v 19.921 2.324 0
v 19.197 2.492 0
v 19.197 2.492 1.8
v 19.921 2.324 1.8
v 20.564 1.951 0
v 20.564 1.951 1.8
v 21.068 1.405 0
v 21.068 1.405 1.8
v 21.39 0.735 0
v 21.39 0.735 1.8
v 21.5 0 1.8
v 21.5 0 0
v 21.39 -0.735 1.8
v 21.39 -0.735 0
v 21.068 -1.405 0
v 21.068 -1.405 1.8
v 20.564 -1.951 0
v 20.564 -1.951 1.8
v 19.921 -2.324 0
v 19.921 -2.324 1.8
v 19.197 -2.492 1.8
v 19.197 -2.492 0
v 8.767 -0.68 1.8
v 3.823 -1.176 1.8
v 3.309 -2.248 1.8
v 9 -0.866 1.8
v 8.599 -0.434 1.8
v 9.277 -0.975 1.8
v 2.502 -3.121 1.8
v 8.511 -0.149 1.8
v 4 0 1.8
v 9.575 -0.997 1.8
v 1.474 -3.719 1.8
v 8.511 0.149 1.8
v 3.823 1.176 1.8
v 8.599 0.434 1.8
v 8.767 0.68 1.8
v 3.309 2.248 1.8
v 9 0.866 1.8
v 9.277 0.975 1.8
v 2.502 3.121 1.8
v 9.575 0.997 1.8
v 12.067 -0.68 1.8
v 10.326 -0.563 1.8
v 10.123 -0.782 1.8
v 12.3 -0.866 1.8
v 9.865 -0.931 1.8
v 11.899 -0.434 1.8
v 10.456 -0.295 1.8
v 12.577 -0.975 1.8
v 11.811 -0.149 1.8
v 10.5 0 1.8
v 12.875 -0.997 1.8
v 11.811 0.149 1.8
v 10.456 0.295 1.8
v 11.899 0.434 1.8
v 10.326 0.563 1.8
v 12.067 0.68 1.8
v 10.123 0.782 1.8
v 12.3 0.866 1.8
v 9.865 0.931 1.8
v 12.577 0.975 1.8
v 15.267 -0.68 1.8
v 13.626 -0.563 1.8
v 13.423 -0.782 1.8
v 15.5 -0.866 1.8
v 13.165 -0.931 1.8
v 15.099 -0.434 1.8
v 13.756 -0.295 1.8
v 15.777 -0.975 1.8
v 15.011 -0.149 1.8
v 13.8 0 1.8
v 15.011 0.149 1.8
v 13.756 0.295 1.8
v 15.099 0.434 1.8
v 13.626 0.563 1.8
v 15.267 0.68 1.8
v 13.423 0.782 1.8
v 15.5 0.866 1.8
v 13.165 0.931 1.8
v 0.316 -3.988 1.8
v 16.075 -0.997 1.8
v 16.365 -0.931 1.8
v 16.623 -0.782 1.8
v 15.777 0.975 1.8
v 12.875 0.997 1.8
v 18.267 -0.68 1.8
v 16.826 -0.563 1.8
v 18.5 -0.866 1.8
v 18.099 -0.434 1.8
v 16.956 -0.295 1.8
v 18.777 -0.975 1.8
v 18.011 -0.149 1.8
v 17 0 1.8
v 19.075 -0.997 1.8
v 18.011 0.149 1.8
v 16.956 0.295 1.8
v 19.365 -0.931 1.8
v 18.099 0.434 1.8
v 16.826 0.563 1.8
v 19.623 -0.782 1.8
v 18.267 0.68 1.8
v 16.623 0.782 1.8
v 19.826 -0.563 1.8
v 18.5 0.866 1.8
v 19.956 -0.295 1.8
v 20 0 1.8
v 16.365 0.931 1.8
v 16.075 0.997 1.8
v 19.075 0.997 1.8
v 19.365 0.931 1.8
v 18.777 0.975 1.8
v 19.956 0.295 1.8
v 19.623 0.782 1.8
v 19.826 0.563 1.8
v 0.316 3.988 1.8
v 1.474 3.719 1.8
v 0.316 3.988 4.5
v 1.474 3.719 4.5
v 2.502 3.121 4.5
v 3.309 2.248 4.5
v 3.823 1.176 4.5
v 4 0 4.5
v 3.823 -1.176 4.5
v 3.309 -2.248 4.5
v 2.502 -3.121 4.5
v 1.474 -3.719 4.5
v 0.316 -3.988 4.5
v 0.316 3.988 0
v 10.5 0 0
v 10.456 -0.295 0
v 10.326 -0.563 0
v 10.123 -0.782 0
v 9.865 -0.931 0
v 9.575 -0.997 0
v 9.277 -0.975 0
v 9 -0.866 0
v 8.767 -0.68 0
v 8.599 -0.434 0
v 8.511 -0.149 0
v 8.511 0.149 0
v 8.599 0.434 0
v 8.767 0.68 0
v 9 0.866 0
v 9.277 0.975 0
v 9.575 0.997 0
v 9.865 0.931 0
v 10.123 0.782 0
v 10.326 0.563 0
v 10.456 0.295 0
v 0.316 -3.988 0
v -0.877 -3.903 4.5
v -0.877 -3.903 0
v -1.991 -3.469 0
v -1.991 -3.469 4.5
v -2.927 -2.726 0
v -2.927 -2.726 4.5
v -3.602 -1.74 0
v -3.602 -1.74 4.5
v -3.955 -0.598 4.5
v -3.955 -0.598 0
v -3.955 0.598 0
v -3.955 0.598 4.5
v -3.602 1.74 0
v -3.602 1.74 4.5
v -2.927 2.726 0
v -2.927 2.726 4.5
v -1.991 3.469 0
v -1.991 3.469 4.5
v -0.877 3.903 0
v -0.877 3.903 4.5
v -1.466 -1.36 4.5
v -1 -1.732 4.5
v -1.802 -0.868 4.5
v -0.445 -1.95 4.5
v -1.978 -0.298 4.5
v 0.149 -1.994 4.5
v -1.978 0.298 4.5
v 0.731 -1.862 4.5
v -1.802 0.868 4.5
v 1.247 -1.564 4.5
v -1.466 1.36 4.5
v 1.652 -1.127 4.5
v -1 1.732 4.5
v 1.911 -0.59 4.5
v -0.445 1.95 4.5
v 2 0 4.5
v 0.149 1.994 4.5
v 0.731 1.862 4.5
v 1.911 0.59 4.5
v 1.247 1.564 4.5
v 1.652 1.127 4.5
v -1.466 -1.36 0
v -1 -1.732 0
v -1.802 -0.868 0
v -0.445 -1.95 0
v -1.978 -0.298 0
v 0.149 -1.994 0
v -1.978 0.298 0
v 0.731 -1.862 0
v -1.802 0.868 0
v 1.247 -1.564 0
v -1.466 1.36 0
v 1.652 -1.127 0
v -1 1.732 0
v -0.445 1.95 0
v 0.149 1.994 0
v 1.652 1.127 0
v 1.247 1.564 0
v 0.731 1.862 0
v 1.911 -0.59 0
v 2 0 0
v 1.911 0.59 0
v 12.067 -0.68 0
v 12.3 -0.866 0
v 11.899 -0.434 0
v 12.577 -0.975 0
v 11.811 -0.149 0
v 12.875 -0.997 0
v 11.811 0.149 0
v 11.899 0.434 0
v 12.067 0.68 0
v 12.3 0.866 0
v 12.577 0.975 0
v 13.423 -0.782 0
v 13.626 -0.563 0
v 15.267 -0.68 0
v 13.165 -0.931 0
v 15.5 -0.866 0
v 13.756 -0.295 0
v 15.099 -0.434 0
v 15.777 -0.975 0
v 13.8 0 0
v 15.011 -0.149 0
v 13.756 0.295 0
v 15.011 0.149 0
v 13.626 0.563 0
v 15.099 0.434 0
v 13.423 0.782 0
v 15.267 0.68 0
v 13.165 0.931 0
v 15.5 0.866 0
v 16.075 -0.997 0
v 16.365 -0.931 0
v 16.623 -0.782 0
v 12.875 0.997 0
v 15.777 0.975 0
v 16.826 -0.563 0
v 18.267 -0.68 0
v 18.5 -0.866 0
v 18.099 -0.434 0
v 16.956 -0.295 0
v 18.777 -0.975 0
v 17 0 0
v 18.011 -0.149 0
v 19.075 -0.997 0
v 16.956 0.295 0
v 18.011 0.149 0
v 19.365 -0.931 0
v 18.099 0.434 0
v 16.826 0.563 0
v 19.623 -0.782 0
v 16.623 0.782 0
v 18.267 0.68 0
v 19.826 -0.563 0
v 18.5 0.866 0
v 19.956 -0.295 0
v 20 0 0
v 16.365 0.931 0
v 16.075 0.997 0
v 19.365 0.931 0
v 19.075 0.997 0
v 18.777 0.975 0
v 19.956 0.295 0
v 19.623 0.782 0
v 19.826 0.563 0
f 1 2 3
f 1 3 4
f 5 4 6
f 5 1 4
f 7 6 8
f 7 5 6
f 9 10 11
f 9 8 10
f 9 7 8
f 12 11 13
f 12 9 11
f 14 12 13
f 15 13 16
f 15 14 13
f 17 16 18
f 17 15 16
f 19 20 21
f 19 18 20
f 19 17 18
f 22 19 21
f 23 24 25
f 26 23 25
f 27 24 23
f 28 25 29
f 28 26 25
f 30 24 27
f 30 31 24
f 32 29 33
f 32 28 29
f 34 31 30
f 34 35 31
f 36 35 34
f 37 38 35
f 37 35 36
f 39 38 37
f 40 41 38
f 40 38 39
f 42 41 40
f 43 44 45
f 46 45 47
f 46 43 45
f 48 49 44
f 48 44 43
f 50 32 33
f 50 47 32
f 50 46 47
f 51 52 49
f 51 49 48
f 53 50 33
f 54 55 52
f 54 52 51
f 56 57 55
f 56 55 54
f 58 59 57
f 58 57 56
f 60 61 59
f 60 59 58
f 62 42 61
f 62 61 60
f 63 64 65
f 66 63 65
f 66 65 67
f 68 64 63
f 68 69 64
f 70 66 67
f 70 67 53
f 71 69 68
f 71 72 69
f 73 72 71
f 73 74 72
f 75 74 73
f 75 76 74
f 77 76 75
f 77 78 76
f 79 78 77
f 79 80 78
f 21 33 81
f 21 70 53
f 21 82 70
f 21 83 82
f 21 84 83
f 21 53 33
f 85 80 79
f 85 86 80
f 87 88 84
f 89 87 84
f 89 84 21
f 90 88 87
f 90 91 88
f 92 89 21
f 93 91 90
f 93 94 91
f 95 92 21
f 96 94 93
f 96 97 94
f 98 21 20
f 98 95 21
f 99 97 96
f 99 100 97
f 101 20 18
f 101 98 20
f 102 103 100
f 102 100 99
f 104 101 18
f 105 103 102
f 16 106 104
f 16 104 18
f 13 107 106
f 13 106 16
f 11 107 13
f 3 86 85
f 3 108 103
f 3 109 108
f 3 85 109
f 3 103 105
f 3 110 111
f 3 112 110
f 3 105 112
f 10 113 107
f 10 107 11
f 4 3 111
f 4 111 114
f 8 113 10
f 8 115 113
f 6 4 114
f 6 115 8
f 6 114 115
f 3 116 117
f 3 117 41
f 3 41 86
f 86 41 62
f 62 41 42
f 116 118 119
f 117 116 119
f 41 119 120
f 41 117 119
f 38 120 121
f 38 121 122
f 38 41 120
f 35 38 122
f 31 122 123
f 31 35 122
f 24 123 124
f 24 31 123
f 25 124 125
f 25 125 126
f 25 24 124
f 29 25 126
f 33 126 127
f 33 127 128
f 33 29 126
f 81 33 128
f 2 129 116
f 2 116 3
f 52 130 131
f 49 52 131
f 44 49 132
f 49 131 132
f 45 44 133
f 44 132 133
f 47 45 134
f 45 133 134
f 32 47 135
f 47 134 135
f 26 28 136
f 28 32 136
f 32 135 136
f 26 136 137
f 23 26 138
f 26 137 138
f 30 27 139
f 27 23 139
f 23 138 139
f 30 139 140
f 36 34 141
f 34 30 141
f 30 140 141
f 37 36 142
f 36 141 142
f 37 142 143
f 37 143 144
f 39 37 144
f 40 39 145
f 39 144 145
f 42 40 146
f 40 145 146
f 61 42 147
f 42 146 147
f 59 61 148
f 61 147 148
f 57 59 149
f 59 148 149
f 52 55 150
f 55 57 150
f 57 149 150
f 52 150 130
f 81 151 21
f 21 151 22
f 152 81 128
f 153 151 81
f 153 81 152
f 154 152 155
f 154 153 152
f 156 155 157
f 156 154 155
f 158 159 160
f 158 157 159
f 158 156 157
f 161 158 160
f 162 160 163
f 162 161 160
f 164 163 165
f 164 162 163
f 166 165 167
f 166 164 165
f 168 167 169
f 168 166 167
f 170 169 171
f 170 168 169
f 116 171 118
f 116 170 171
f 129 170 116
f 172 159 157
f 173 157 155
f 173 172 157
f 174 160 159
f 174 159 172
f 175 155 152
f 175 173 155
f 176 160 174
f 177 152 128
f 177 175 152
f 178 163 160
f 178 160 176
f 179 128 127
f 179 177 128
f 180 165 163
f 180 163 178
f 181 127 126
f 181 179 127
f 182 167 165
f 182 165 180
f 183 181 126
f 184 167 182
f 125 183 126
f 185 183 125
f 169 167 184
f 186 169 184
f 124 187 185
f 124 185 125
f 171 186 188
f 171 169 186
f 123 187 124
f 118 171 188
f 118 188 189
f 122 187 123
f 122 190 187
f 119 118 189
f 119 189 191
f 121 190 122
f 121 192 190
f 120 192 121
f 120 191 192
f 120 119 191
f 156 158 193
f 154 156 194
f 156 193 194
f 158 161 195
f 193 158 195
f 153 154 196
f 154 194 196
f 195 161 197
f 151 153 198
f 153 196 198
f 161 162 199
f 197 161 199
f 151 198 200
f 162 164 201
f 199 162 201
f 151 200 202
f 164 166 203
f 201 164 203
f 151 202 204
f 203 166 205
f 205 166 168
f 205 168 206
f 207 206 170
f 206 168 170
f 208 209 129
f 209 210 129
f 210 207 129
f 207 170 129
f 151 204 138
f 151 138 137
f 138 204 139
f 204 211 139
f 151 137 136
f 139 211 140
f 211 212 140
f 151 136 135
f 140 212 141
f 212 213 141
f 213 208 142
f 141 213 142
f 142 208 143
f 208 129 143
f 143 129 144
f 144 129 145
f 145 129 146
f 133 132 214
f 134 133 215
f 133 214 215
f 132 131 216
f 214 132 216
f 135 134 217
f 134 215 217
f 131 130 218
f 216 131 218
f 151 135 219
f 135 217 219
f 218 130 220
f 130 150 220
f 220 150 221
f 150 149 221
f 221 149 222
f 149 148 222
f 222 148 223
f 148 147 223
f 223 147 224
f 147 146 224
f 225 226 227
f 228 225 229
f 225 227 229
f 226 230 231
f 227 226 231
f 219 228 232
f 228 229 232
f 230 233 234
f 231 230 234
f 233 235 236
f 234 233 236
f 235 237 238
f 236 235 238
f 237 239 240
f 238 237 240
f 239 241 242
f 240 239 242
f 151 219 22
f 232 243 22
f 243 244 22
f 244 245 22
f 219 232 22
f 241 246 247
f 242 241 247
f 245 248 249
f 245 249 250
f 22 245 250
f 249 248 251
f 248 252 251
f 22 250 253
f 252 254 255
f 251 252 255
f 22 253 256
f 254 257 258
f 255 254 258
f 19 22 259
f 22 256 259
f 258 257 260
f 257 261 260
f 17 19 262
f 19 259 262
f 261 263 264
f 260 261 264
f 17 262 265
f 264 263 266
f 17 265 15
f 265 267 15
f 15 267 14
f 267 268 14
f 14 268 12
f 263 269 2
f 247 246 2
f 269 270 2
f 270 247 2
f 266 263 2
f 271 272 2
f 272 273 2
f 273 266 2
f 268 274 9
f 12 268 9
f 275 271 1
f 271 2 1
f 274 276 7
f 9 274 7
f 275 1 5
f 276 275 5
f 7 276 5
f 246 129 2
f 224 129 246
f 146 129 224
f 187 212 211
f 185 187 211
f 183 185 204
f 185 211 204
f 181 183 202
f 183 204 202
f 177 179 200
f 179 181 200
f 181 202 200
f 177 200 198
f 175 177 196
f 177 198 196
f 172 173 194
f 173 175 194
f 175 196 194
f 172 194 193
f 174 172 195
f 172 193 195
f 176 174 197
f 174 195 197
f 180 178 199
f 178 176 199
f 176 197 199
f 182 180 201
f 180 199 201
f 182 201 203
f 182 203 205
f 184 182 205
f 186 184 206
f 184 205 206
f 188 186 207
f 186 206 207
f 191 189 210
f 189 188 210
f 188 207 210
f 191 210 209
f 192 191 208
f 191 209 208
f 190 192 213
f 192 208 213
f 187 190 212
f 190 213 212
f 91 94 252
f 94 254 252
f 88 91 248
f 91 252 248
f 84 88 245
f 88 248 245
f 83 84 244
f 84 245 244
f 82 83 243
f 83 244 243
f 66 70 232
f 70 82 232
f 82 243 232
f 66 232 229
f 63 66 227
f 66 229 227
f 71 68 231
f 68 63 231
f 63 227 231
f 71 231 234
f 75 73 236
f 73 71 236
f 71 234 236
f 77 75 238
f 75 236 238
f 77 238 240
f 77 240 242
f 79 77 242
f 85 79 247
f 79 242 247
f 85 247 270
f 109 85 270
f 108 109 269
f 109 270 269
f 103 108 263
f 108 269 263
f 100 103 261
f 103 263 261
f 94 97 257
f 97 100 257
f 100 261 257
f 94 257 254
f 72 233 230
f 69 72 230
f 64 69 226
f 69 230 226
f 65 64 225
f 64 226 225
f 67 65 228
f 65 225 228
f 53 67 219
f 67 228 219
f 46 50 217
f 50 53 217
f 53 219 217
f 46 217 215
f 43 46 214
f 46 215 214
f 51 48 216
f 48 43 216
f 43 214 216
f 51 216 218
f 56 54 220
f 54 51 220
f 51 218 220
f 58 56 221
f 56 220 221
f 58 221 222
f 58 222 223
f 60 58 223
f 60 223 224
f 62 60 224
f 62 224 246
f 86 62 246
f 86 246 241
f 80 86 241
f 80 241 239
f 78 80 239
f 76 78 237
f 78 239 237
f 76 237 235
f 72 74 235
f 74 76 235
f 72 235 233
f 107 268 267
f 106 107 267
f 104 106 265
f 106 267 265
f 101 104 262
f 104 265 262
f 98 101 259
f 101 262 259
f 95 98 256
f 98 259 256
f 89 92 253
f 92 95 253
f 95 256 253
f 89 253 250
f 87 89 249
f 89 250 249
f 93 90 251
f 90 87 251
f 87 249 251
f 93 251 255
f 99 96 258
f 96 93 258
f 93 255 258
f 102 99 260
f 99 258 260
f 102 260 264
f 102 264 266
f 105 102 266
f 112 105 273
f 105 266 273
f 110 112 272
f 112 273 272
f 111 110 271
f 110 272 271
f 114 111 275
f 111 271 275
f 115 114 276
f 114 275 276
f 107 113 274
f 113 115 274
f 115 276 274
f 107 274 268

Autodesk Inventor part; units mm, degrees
ref_plane "YZ Plane" through (0, 0, 0) normal (1, 0, 0) x (0, 1, 0)
ref_plane "XZ Plane" through (0, 0, 0) normal (0, 1, 0) x (-1, 0, 0)
ref_plane "XY Plane" through (0, 0, 0) normal (0, 0, 1) x (1, 0, 0)
sketch "Skizze1" plane through (0, 0, 0) normal (0, 0, 1) x (1, 0, 0)
  line L0 (0, 5.6) -> (0, -5.6) construction
  line L1 (-9.1, 0) -> (26.6, 0) construction
  circle A0 centre (0, 0) radius 2
  circle A1 centre (9.5, 0) radius 1
  circle A2 centre (16, 0) radius 1
  circle A3 centre (19, 0) radius 1
  arc A4 (19.1974, -2.4922) -> (19.1974, 2.4922) centre (19, 0) ccw
  arc A5 (0.3158, 3.9875) -> (0.3158, -3.9875) centre (0, 0) ccw
  line L2 (0.3158, 3.9875) -> (19.1974, 2.4922)
  line L3 (0.3158, -3.9875) -> (19.1974, -2.4922)
  circle A6 centre (12.8, 0) radius 1
  circle A7 centre (0, 0) radius 4
  point P0 (0.5263, 3.9652)
  point P1 (0.6579, -1.8887)
  point P2 (0.6579, 1.8887)
  dimension "d0" = 9.5
  dimension "d1" = 16
  dimension "d2" = 19
  dimension "d3" = 5
  dimension "d4" = 2
  dimension "d5" = 4
  dimension "d6" = 8
  dimension "d17" = 12.8
extrude "Extrusion1" add sketch "Skizze1" along normal blind 1.8
extrude "Extrusion2" add sketch "Skizze1" along normal blind 4.5 contours A5 A7
properties part number "Servo-Arm-20mm"
